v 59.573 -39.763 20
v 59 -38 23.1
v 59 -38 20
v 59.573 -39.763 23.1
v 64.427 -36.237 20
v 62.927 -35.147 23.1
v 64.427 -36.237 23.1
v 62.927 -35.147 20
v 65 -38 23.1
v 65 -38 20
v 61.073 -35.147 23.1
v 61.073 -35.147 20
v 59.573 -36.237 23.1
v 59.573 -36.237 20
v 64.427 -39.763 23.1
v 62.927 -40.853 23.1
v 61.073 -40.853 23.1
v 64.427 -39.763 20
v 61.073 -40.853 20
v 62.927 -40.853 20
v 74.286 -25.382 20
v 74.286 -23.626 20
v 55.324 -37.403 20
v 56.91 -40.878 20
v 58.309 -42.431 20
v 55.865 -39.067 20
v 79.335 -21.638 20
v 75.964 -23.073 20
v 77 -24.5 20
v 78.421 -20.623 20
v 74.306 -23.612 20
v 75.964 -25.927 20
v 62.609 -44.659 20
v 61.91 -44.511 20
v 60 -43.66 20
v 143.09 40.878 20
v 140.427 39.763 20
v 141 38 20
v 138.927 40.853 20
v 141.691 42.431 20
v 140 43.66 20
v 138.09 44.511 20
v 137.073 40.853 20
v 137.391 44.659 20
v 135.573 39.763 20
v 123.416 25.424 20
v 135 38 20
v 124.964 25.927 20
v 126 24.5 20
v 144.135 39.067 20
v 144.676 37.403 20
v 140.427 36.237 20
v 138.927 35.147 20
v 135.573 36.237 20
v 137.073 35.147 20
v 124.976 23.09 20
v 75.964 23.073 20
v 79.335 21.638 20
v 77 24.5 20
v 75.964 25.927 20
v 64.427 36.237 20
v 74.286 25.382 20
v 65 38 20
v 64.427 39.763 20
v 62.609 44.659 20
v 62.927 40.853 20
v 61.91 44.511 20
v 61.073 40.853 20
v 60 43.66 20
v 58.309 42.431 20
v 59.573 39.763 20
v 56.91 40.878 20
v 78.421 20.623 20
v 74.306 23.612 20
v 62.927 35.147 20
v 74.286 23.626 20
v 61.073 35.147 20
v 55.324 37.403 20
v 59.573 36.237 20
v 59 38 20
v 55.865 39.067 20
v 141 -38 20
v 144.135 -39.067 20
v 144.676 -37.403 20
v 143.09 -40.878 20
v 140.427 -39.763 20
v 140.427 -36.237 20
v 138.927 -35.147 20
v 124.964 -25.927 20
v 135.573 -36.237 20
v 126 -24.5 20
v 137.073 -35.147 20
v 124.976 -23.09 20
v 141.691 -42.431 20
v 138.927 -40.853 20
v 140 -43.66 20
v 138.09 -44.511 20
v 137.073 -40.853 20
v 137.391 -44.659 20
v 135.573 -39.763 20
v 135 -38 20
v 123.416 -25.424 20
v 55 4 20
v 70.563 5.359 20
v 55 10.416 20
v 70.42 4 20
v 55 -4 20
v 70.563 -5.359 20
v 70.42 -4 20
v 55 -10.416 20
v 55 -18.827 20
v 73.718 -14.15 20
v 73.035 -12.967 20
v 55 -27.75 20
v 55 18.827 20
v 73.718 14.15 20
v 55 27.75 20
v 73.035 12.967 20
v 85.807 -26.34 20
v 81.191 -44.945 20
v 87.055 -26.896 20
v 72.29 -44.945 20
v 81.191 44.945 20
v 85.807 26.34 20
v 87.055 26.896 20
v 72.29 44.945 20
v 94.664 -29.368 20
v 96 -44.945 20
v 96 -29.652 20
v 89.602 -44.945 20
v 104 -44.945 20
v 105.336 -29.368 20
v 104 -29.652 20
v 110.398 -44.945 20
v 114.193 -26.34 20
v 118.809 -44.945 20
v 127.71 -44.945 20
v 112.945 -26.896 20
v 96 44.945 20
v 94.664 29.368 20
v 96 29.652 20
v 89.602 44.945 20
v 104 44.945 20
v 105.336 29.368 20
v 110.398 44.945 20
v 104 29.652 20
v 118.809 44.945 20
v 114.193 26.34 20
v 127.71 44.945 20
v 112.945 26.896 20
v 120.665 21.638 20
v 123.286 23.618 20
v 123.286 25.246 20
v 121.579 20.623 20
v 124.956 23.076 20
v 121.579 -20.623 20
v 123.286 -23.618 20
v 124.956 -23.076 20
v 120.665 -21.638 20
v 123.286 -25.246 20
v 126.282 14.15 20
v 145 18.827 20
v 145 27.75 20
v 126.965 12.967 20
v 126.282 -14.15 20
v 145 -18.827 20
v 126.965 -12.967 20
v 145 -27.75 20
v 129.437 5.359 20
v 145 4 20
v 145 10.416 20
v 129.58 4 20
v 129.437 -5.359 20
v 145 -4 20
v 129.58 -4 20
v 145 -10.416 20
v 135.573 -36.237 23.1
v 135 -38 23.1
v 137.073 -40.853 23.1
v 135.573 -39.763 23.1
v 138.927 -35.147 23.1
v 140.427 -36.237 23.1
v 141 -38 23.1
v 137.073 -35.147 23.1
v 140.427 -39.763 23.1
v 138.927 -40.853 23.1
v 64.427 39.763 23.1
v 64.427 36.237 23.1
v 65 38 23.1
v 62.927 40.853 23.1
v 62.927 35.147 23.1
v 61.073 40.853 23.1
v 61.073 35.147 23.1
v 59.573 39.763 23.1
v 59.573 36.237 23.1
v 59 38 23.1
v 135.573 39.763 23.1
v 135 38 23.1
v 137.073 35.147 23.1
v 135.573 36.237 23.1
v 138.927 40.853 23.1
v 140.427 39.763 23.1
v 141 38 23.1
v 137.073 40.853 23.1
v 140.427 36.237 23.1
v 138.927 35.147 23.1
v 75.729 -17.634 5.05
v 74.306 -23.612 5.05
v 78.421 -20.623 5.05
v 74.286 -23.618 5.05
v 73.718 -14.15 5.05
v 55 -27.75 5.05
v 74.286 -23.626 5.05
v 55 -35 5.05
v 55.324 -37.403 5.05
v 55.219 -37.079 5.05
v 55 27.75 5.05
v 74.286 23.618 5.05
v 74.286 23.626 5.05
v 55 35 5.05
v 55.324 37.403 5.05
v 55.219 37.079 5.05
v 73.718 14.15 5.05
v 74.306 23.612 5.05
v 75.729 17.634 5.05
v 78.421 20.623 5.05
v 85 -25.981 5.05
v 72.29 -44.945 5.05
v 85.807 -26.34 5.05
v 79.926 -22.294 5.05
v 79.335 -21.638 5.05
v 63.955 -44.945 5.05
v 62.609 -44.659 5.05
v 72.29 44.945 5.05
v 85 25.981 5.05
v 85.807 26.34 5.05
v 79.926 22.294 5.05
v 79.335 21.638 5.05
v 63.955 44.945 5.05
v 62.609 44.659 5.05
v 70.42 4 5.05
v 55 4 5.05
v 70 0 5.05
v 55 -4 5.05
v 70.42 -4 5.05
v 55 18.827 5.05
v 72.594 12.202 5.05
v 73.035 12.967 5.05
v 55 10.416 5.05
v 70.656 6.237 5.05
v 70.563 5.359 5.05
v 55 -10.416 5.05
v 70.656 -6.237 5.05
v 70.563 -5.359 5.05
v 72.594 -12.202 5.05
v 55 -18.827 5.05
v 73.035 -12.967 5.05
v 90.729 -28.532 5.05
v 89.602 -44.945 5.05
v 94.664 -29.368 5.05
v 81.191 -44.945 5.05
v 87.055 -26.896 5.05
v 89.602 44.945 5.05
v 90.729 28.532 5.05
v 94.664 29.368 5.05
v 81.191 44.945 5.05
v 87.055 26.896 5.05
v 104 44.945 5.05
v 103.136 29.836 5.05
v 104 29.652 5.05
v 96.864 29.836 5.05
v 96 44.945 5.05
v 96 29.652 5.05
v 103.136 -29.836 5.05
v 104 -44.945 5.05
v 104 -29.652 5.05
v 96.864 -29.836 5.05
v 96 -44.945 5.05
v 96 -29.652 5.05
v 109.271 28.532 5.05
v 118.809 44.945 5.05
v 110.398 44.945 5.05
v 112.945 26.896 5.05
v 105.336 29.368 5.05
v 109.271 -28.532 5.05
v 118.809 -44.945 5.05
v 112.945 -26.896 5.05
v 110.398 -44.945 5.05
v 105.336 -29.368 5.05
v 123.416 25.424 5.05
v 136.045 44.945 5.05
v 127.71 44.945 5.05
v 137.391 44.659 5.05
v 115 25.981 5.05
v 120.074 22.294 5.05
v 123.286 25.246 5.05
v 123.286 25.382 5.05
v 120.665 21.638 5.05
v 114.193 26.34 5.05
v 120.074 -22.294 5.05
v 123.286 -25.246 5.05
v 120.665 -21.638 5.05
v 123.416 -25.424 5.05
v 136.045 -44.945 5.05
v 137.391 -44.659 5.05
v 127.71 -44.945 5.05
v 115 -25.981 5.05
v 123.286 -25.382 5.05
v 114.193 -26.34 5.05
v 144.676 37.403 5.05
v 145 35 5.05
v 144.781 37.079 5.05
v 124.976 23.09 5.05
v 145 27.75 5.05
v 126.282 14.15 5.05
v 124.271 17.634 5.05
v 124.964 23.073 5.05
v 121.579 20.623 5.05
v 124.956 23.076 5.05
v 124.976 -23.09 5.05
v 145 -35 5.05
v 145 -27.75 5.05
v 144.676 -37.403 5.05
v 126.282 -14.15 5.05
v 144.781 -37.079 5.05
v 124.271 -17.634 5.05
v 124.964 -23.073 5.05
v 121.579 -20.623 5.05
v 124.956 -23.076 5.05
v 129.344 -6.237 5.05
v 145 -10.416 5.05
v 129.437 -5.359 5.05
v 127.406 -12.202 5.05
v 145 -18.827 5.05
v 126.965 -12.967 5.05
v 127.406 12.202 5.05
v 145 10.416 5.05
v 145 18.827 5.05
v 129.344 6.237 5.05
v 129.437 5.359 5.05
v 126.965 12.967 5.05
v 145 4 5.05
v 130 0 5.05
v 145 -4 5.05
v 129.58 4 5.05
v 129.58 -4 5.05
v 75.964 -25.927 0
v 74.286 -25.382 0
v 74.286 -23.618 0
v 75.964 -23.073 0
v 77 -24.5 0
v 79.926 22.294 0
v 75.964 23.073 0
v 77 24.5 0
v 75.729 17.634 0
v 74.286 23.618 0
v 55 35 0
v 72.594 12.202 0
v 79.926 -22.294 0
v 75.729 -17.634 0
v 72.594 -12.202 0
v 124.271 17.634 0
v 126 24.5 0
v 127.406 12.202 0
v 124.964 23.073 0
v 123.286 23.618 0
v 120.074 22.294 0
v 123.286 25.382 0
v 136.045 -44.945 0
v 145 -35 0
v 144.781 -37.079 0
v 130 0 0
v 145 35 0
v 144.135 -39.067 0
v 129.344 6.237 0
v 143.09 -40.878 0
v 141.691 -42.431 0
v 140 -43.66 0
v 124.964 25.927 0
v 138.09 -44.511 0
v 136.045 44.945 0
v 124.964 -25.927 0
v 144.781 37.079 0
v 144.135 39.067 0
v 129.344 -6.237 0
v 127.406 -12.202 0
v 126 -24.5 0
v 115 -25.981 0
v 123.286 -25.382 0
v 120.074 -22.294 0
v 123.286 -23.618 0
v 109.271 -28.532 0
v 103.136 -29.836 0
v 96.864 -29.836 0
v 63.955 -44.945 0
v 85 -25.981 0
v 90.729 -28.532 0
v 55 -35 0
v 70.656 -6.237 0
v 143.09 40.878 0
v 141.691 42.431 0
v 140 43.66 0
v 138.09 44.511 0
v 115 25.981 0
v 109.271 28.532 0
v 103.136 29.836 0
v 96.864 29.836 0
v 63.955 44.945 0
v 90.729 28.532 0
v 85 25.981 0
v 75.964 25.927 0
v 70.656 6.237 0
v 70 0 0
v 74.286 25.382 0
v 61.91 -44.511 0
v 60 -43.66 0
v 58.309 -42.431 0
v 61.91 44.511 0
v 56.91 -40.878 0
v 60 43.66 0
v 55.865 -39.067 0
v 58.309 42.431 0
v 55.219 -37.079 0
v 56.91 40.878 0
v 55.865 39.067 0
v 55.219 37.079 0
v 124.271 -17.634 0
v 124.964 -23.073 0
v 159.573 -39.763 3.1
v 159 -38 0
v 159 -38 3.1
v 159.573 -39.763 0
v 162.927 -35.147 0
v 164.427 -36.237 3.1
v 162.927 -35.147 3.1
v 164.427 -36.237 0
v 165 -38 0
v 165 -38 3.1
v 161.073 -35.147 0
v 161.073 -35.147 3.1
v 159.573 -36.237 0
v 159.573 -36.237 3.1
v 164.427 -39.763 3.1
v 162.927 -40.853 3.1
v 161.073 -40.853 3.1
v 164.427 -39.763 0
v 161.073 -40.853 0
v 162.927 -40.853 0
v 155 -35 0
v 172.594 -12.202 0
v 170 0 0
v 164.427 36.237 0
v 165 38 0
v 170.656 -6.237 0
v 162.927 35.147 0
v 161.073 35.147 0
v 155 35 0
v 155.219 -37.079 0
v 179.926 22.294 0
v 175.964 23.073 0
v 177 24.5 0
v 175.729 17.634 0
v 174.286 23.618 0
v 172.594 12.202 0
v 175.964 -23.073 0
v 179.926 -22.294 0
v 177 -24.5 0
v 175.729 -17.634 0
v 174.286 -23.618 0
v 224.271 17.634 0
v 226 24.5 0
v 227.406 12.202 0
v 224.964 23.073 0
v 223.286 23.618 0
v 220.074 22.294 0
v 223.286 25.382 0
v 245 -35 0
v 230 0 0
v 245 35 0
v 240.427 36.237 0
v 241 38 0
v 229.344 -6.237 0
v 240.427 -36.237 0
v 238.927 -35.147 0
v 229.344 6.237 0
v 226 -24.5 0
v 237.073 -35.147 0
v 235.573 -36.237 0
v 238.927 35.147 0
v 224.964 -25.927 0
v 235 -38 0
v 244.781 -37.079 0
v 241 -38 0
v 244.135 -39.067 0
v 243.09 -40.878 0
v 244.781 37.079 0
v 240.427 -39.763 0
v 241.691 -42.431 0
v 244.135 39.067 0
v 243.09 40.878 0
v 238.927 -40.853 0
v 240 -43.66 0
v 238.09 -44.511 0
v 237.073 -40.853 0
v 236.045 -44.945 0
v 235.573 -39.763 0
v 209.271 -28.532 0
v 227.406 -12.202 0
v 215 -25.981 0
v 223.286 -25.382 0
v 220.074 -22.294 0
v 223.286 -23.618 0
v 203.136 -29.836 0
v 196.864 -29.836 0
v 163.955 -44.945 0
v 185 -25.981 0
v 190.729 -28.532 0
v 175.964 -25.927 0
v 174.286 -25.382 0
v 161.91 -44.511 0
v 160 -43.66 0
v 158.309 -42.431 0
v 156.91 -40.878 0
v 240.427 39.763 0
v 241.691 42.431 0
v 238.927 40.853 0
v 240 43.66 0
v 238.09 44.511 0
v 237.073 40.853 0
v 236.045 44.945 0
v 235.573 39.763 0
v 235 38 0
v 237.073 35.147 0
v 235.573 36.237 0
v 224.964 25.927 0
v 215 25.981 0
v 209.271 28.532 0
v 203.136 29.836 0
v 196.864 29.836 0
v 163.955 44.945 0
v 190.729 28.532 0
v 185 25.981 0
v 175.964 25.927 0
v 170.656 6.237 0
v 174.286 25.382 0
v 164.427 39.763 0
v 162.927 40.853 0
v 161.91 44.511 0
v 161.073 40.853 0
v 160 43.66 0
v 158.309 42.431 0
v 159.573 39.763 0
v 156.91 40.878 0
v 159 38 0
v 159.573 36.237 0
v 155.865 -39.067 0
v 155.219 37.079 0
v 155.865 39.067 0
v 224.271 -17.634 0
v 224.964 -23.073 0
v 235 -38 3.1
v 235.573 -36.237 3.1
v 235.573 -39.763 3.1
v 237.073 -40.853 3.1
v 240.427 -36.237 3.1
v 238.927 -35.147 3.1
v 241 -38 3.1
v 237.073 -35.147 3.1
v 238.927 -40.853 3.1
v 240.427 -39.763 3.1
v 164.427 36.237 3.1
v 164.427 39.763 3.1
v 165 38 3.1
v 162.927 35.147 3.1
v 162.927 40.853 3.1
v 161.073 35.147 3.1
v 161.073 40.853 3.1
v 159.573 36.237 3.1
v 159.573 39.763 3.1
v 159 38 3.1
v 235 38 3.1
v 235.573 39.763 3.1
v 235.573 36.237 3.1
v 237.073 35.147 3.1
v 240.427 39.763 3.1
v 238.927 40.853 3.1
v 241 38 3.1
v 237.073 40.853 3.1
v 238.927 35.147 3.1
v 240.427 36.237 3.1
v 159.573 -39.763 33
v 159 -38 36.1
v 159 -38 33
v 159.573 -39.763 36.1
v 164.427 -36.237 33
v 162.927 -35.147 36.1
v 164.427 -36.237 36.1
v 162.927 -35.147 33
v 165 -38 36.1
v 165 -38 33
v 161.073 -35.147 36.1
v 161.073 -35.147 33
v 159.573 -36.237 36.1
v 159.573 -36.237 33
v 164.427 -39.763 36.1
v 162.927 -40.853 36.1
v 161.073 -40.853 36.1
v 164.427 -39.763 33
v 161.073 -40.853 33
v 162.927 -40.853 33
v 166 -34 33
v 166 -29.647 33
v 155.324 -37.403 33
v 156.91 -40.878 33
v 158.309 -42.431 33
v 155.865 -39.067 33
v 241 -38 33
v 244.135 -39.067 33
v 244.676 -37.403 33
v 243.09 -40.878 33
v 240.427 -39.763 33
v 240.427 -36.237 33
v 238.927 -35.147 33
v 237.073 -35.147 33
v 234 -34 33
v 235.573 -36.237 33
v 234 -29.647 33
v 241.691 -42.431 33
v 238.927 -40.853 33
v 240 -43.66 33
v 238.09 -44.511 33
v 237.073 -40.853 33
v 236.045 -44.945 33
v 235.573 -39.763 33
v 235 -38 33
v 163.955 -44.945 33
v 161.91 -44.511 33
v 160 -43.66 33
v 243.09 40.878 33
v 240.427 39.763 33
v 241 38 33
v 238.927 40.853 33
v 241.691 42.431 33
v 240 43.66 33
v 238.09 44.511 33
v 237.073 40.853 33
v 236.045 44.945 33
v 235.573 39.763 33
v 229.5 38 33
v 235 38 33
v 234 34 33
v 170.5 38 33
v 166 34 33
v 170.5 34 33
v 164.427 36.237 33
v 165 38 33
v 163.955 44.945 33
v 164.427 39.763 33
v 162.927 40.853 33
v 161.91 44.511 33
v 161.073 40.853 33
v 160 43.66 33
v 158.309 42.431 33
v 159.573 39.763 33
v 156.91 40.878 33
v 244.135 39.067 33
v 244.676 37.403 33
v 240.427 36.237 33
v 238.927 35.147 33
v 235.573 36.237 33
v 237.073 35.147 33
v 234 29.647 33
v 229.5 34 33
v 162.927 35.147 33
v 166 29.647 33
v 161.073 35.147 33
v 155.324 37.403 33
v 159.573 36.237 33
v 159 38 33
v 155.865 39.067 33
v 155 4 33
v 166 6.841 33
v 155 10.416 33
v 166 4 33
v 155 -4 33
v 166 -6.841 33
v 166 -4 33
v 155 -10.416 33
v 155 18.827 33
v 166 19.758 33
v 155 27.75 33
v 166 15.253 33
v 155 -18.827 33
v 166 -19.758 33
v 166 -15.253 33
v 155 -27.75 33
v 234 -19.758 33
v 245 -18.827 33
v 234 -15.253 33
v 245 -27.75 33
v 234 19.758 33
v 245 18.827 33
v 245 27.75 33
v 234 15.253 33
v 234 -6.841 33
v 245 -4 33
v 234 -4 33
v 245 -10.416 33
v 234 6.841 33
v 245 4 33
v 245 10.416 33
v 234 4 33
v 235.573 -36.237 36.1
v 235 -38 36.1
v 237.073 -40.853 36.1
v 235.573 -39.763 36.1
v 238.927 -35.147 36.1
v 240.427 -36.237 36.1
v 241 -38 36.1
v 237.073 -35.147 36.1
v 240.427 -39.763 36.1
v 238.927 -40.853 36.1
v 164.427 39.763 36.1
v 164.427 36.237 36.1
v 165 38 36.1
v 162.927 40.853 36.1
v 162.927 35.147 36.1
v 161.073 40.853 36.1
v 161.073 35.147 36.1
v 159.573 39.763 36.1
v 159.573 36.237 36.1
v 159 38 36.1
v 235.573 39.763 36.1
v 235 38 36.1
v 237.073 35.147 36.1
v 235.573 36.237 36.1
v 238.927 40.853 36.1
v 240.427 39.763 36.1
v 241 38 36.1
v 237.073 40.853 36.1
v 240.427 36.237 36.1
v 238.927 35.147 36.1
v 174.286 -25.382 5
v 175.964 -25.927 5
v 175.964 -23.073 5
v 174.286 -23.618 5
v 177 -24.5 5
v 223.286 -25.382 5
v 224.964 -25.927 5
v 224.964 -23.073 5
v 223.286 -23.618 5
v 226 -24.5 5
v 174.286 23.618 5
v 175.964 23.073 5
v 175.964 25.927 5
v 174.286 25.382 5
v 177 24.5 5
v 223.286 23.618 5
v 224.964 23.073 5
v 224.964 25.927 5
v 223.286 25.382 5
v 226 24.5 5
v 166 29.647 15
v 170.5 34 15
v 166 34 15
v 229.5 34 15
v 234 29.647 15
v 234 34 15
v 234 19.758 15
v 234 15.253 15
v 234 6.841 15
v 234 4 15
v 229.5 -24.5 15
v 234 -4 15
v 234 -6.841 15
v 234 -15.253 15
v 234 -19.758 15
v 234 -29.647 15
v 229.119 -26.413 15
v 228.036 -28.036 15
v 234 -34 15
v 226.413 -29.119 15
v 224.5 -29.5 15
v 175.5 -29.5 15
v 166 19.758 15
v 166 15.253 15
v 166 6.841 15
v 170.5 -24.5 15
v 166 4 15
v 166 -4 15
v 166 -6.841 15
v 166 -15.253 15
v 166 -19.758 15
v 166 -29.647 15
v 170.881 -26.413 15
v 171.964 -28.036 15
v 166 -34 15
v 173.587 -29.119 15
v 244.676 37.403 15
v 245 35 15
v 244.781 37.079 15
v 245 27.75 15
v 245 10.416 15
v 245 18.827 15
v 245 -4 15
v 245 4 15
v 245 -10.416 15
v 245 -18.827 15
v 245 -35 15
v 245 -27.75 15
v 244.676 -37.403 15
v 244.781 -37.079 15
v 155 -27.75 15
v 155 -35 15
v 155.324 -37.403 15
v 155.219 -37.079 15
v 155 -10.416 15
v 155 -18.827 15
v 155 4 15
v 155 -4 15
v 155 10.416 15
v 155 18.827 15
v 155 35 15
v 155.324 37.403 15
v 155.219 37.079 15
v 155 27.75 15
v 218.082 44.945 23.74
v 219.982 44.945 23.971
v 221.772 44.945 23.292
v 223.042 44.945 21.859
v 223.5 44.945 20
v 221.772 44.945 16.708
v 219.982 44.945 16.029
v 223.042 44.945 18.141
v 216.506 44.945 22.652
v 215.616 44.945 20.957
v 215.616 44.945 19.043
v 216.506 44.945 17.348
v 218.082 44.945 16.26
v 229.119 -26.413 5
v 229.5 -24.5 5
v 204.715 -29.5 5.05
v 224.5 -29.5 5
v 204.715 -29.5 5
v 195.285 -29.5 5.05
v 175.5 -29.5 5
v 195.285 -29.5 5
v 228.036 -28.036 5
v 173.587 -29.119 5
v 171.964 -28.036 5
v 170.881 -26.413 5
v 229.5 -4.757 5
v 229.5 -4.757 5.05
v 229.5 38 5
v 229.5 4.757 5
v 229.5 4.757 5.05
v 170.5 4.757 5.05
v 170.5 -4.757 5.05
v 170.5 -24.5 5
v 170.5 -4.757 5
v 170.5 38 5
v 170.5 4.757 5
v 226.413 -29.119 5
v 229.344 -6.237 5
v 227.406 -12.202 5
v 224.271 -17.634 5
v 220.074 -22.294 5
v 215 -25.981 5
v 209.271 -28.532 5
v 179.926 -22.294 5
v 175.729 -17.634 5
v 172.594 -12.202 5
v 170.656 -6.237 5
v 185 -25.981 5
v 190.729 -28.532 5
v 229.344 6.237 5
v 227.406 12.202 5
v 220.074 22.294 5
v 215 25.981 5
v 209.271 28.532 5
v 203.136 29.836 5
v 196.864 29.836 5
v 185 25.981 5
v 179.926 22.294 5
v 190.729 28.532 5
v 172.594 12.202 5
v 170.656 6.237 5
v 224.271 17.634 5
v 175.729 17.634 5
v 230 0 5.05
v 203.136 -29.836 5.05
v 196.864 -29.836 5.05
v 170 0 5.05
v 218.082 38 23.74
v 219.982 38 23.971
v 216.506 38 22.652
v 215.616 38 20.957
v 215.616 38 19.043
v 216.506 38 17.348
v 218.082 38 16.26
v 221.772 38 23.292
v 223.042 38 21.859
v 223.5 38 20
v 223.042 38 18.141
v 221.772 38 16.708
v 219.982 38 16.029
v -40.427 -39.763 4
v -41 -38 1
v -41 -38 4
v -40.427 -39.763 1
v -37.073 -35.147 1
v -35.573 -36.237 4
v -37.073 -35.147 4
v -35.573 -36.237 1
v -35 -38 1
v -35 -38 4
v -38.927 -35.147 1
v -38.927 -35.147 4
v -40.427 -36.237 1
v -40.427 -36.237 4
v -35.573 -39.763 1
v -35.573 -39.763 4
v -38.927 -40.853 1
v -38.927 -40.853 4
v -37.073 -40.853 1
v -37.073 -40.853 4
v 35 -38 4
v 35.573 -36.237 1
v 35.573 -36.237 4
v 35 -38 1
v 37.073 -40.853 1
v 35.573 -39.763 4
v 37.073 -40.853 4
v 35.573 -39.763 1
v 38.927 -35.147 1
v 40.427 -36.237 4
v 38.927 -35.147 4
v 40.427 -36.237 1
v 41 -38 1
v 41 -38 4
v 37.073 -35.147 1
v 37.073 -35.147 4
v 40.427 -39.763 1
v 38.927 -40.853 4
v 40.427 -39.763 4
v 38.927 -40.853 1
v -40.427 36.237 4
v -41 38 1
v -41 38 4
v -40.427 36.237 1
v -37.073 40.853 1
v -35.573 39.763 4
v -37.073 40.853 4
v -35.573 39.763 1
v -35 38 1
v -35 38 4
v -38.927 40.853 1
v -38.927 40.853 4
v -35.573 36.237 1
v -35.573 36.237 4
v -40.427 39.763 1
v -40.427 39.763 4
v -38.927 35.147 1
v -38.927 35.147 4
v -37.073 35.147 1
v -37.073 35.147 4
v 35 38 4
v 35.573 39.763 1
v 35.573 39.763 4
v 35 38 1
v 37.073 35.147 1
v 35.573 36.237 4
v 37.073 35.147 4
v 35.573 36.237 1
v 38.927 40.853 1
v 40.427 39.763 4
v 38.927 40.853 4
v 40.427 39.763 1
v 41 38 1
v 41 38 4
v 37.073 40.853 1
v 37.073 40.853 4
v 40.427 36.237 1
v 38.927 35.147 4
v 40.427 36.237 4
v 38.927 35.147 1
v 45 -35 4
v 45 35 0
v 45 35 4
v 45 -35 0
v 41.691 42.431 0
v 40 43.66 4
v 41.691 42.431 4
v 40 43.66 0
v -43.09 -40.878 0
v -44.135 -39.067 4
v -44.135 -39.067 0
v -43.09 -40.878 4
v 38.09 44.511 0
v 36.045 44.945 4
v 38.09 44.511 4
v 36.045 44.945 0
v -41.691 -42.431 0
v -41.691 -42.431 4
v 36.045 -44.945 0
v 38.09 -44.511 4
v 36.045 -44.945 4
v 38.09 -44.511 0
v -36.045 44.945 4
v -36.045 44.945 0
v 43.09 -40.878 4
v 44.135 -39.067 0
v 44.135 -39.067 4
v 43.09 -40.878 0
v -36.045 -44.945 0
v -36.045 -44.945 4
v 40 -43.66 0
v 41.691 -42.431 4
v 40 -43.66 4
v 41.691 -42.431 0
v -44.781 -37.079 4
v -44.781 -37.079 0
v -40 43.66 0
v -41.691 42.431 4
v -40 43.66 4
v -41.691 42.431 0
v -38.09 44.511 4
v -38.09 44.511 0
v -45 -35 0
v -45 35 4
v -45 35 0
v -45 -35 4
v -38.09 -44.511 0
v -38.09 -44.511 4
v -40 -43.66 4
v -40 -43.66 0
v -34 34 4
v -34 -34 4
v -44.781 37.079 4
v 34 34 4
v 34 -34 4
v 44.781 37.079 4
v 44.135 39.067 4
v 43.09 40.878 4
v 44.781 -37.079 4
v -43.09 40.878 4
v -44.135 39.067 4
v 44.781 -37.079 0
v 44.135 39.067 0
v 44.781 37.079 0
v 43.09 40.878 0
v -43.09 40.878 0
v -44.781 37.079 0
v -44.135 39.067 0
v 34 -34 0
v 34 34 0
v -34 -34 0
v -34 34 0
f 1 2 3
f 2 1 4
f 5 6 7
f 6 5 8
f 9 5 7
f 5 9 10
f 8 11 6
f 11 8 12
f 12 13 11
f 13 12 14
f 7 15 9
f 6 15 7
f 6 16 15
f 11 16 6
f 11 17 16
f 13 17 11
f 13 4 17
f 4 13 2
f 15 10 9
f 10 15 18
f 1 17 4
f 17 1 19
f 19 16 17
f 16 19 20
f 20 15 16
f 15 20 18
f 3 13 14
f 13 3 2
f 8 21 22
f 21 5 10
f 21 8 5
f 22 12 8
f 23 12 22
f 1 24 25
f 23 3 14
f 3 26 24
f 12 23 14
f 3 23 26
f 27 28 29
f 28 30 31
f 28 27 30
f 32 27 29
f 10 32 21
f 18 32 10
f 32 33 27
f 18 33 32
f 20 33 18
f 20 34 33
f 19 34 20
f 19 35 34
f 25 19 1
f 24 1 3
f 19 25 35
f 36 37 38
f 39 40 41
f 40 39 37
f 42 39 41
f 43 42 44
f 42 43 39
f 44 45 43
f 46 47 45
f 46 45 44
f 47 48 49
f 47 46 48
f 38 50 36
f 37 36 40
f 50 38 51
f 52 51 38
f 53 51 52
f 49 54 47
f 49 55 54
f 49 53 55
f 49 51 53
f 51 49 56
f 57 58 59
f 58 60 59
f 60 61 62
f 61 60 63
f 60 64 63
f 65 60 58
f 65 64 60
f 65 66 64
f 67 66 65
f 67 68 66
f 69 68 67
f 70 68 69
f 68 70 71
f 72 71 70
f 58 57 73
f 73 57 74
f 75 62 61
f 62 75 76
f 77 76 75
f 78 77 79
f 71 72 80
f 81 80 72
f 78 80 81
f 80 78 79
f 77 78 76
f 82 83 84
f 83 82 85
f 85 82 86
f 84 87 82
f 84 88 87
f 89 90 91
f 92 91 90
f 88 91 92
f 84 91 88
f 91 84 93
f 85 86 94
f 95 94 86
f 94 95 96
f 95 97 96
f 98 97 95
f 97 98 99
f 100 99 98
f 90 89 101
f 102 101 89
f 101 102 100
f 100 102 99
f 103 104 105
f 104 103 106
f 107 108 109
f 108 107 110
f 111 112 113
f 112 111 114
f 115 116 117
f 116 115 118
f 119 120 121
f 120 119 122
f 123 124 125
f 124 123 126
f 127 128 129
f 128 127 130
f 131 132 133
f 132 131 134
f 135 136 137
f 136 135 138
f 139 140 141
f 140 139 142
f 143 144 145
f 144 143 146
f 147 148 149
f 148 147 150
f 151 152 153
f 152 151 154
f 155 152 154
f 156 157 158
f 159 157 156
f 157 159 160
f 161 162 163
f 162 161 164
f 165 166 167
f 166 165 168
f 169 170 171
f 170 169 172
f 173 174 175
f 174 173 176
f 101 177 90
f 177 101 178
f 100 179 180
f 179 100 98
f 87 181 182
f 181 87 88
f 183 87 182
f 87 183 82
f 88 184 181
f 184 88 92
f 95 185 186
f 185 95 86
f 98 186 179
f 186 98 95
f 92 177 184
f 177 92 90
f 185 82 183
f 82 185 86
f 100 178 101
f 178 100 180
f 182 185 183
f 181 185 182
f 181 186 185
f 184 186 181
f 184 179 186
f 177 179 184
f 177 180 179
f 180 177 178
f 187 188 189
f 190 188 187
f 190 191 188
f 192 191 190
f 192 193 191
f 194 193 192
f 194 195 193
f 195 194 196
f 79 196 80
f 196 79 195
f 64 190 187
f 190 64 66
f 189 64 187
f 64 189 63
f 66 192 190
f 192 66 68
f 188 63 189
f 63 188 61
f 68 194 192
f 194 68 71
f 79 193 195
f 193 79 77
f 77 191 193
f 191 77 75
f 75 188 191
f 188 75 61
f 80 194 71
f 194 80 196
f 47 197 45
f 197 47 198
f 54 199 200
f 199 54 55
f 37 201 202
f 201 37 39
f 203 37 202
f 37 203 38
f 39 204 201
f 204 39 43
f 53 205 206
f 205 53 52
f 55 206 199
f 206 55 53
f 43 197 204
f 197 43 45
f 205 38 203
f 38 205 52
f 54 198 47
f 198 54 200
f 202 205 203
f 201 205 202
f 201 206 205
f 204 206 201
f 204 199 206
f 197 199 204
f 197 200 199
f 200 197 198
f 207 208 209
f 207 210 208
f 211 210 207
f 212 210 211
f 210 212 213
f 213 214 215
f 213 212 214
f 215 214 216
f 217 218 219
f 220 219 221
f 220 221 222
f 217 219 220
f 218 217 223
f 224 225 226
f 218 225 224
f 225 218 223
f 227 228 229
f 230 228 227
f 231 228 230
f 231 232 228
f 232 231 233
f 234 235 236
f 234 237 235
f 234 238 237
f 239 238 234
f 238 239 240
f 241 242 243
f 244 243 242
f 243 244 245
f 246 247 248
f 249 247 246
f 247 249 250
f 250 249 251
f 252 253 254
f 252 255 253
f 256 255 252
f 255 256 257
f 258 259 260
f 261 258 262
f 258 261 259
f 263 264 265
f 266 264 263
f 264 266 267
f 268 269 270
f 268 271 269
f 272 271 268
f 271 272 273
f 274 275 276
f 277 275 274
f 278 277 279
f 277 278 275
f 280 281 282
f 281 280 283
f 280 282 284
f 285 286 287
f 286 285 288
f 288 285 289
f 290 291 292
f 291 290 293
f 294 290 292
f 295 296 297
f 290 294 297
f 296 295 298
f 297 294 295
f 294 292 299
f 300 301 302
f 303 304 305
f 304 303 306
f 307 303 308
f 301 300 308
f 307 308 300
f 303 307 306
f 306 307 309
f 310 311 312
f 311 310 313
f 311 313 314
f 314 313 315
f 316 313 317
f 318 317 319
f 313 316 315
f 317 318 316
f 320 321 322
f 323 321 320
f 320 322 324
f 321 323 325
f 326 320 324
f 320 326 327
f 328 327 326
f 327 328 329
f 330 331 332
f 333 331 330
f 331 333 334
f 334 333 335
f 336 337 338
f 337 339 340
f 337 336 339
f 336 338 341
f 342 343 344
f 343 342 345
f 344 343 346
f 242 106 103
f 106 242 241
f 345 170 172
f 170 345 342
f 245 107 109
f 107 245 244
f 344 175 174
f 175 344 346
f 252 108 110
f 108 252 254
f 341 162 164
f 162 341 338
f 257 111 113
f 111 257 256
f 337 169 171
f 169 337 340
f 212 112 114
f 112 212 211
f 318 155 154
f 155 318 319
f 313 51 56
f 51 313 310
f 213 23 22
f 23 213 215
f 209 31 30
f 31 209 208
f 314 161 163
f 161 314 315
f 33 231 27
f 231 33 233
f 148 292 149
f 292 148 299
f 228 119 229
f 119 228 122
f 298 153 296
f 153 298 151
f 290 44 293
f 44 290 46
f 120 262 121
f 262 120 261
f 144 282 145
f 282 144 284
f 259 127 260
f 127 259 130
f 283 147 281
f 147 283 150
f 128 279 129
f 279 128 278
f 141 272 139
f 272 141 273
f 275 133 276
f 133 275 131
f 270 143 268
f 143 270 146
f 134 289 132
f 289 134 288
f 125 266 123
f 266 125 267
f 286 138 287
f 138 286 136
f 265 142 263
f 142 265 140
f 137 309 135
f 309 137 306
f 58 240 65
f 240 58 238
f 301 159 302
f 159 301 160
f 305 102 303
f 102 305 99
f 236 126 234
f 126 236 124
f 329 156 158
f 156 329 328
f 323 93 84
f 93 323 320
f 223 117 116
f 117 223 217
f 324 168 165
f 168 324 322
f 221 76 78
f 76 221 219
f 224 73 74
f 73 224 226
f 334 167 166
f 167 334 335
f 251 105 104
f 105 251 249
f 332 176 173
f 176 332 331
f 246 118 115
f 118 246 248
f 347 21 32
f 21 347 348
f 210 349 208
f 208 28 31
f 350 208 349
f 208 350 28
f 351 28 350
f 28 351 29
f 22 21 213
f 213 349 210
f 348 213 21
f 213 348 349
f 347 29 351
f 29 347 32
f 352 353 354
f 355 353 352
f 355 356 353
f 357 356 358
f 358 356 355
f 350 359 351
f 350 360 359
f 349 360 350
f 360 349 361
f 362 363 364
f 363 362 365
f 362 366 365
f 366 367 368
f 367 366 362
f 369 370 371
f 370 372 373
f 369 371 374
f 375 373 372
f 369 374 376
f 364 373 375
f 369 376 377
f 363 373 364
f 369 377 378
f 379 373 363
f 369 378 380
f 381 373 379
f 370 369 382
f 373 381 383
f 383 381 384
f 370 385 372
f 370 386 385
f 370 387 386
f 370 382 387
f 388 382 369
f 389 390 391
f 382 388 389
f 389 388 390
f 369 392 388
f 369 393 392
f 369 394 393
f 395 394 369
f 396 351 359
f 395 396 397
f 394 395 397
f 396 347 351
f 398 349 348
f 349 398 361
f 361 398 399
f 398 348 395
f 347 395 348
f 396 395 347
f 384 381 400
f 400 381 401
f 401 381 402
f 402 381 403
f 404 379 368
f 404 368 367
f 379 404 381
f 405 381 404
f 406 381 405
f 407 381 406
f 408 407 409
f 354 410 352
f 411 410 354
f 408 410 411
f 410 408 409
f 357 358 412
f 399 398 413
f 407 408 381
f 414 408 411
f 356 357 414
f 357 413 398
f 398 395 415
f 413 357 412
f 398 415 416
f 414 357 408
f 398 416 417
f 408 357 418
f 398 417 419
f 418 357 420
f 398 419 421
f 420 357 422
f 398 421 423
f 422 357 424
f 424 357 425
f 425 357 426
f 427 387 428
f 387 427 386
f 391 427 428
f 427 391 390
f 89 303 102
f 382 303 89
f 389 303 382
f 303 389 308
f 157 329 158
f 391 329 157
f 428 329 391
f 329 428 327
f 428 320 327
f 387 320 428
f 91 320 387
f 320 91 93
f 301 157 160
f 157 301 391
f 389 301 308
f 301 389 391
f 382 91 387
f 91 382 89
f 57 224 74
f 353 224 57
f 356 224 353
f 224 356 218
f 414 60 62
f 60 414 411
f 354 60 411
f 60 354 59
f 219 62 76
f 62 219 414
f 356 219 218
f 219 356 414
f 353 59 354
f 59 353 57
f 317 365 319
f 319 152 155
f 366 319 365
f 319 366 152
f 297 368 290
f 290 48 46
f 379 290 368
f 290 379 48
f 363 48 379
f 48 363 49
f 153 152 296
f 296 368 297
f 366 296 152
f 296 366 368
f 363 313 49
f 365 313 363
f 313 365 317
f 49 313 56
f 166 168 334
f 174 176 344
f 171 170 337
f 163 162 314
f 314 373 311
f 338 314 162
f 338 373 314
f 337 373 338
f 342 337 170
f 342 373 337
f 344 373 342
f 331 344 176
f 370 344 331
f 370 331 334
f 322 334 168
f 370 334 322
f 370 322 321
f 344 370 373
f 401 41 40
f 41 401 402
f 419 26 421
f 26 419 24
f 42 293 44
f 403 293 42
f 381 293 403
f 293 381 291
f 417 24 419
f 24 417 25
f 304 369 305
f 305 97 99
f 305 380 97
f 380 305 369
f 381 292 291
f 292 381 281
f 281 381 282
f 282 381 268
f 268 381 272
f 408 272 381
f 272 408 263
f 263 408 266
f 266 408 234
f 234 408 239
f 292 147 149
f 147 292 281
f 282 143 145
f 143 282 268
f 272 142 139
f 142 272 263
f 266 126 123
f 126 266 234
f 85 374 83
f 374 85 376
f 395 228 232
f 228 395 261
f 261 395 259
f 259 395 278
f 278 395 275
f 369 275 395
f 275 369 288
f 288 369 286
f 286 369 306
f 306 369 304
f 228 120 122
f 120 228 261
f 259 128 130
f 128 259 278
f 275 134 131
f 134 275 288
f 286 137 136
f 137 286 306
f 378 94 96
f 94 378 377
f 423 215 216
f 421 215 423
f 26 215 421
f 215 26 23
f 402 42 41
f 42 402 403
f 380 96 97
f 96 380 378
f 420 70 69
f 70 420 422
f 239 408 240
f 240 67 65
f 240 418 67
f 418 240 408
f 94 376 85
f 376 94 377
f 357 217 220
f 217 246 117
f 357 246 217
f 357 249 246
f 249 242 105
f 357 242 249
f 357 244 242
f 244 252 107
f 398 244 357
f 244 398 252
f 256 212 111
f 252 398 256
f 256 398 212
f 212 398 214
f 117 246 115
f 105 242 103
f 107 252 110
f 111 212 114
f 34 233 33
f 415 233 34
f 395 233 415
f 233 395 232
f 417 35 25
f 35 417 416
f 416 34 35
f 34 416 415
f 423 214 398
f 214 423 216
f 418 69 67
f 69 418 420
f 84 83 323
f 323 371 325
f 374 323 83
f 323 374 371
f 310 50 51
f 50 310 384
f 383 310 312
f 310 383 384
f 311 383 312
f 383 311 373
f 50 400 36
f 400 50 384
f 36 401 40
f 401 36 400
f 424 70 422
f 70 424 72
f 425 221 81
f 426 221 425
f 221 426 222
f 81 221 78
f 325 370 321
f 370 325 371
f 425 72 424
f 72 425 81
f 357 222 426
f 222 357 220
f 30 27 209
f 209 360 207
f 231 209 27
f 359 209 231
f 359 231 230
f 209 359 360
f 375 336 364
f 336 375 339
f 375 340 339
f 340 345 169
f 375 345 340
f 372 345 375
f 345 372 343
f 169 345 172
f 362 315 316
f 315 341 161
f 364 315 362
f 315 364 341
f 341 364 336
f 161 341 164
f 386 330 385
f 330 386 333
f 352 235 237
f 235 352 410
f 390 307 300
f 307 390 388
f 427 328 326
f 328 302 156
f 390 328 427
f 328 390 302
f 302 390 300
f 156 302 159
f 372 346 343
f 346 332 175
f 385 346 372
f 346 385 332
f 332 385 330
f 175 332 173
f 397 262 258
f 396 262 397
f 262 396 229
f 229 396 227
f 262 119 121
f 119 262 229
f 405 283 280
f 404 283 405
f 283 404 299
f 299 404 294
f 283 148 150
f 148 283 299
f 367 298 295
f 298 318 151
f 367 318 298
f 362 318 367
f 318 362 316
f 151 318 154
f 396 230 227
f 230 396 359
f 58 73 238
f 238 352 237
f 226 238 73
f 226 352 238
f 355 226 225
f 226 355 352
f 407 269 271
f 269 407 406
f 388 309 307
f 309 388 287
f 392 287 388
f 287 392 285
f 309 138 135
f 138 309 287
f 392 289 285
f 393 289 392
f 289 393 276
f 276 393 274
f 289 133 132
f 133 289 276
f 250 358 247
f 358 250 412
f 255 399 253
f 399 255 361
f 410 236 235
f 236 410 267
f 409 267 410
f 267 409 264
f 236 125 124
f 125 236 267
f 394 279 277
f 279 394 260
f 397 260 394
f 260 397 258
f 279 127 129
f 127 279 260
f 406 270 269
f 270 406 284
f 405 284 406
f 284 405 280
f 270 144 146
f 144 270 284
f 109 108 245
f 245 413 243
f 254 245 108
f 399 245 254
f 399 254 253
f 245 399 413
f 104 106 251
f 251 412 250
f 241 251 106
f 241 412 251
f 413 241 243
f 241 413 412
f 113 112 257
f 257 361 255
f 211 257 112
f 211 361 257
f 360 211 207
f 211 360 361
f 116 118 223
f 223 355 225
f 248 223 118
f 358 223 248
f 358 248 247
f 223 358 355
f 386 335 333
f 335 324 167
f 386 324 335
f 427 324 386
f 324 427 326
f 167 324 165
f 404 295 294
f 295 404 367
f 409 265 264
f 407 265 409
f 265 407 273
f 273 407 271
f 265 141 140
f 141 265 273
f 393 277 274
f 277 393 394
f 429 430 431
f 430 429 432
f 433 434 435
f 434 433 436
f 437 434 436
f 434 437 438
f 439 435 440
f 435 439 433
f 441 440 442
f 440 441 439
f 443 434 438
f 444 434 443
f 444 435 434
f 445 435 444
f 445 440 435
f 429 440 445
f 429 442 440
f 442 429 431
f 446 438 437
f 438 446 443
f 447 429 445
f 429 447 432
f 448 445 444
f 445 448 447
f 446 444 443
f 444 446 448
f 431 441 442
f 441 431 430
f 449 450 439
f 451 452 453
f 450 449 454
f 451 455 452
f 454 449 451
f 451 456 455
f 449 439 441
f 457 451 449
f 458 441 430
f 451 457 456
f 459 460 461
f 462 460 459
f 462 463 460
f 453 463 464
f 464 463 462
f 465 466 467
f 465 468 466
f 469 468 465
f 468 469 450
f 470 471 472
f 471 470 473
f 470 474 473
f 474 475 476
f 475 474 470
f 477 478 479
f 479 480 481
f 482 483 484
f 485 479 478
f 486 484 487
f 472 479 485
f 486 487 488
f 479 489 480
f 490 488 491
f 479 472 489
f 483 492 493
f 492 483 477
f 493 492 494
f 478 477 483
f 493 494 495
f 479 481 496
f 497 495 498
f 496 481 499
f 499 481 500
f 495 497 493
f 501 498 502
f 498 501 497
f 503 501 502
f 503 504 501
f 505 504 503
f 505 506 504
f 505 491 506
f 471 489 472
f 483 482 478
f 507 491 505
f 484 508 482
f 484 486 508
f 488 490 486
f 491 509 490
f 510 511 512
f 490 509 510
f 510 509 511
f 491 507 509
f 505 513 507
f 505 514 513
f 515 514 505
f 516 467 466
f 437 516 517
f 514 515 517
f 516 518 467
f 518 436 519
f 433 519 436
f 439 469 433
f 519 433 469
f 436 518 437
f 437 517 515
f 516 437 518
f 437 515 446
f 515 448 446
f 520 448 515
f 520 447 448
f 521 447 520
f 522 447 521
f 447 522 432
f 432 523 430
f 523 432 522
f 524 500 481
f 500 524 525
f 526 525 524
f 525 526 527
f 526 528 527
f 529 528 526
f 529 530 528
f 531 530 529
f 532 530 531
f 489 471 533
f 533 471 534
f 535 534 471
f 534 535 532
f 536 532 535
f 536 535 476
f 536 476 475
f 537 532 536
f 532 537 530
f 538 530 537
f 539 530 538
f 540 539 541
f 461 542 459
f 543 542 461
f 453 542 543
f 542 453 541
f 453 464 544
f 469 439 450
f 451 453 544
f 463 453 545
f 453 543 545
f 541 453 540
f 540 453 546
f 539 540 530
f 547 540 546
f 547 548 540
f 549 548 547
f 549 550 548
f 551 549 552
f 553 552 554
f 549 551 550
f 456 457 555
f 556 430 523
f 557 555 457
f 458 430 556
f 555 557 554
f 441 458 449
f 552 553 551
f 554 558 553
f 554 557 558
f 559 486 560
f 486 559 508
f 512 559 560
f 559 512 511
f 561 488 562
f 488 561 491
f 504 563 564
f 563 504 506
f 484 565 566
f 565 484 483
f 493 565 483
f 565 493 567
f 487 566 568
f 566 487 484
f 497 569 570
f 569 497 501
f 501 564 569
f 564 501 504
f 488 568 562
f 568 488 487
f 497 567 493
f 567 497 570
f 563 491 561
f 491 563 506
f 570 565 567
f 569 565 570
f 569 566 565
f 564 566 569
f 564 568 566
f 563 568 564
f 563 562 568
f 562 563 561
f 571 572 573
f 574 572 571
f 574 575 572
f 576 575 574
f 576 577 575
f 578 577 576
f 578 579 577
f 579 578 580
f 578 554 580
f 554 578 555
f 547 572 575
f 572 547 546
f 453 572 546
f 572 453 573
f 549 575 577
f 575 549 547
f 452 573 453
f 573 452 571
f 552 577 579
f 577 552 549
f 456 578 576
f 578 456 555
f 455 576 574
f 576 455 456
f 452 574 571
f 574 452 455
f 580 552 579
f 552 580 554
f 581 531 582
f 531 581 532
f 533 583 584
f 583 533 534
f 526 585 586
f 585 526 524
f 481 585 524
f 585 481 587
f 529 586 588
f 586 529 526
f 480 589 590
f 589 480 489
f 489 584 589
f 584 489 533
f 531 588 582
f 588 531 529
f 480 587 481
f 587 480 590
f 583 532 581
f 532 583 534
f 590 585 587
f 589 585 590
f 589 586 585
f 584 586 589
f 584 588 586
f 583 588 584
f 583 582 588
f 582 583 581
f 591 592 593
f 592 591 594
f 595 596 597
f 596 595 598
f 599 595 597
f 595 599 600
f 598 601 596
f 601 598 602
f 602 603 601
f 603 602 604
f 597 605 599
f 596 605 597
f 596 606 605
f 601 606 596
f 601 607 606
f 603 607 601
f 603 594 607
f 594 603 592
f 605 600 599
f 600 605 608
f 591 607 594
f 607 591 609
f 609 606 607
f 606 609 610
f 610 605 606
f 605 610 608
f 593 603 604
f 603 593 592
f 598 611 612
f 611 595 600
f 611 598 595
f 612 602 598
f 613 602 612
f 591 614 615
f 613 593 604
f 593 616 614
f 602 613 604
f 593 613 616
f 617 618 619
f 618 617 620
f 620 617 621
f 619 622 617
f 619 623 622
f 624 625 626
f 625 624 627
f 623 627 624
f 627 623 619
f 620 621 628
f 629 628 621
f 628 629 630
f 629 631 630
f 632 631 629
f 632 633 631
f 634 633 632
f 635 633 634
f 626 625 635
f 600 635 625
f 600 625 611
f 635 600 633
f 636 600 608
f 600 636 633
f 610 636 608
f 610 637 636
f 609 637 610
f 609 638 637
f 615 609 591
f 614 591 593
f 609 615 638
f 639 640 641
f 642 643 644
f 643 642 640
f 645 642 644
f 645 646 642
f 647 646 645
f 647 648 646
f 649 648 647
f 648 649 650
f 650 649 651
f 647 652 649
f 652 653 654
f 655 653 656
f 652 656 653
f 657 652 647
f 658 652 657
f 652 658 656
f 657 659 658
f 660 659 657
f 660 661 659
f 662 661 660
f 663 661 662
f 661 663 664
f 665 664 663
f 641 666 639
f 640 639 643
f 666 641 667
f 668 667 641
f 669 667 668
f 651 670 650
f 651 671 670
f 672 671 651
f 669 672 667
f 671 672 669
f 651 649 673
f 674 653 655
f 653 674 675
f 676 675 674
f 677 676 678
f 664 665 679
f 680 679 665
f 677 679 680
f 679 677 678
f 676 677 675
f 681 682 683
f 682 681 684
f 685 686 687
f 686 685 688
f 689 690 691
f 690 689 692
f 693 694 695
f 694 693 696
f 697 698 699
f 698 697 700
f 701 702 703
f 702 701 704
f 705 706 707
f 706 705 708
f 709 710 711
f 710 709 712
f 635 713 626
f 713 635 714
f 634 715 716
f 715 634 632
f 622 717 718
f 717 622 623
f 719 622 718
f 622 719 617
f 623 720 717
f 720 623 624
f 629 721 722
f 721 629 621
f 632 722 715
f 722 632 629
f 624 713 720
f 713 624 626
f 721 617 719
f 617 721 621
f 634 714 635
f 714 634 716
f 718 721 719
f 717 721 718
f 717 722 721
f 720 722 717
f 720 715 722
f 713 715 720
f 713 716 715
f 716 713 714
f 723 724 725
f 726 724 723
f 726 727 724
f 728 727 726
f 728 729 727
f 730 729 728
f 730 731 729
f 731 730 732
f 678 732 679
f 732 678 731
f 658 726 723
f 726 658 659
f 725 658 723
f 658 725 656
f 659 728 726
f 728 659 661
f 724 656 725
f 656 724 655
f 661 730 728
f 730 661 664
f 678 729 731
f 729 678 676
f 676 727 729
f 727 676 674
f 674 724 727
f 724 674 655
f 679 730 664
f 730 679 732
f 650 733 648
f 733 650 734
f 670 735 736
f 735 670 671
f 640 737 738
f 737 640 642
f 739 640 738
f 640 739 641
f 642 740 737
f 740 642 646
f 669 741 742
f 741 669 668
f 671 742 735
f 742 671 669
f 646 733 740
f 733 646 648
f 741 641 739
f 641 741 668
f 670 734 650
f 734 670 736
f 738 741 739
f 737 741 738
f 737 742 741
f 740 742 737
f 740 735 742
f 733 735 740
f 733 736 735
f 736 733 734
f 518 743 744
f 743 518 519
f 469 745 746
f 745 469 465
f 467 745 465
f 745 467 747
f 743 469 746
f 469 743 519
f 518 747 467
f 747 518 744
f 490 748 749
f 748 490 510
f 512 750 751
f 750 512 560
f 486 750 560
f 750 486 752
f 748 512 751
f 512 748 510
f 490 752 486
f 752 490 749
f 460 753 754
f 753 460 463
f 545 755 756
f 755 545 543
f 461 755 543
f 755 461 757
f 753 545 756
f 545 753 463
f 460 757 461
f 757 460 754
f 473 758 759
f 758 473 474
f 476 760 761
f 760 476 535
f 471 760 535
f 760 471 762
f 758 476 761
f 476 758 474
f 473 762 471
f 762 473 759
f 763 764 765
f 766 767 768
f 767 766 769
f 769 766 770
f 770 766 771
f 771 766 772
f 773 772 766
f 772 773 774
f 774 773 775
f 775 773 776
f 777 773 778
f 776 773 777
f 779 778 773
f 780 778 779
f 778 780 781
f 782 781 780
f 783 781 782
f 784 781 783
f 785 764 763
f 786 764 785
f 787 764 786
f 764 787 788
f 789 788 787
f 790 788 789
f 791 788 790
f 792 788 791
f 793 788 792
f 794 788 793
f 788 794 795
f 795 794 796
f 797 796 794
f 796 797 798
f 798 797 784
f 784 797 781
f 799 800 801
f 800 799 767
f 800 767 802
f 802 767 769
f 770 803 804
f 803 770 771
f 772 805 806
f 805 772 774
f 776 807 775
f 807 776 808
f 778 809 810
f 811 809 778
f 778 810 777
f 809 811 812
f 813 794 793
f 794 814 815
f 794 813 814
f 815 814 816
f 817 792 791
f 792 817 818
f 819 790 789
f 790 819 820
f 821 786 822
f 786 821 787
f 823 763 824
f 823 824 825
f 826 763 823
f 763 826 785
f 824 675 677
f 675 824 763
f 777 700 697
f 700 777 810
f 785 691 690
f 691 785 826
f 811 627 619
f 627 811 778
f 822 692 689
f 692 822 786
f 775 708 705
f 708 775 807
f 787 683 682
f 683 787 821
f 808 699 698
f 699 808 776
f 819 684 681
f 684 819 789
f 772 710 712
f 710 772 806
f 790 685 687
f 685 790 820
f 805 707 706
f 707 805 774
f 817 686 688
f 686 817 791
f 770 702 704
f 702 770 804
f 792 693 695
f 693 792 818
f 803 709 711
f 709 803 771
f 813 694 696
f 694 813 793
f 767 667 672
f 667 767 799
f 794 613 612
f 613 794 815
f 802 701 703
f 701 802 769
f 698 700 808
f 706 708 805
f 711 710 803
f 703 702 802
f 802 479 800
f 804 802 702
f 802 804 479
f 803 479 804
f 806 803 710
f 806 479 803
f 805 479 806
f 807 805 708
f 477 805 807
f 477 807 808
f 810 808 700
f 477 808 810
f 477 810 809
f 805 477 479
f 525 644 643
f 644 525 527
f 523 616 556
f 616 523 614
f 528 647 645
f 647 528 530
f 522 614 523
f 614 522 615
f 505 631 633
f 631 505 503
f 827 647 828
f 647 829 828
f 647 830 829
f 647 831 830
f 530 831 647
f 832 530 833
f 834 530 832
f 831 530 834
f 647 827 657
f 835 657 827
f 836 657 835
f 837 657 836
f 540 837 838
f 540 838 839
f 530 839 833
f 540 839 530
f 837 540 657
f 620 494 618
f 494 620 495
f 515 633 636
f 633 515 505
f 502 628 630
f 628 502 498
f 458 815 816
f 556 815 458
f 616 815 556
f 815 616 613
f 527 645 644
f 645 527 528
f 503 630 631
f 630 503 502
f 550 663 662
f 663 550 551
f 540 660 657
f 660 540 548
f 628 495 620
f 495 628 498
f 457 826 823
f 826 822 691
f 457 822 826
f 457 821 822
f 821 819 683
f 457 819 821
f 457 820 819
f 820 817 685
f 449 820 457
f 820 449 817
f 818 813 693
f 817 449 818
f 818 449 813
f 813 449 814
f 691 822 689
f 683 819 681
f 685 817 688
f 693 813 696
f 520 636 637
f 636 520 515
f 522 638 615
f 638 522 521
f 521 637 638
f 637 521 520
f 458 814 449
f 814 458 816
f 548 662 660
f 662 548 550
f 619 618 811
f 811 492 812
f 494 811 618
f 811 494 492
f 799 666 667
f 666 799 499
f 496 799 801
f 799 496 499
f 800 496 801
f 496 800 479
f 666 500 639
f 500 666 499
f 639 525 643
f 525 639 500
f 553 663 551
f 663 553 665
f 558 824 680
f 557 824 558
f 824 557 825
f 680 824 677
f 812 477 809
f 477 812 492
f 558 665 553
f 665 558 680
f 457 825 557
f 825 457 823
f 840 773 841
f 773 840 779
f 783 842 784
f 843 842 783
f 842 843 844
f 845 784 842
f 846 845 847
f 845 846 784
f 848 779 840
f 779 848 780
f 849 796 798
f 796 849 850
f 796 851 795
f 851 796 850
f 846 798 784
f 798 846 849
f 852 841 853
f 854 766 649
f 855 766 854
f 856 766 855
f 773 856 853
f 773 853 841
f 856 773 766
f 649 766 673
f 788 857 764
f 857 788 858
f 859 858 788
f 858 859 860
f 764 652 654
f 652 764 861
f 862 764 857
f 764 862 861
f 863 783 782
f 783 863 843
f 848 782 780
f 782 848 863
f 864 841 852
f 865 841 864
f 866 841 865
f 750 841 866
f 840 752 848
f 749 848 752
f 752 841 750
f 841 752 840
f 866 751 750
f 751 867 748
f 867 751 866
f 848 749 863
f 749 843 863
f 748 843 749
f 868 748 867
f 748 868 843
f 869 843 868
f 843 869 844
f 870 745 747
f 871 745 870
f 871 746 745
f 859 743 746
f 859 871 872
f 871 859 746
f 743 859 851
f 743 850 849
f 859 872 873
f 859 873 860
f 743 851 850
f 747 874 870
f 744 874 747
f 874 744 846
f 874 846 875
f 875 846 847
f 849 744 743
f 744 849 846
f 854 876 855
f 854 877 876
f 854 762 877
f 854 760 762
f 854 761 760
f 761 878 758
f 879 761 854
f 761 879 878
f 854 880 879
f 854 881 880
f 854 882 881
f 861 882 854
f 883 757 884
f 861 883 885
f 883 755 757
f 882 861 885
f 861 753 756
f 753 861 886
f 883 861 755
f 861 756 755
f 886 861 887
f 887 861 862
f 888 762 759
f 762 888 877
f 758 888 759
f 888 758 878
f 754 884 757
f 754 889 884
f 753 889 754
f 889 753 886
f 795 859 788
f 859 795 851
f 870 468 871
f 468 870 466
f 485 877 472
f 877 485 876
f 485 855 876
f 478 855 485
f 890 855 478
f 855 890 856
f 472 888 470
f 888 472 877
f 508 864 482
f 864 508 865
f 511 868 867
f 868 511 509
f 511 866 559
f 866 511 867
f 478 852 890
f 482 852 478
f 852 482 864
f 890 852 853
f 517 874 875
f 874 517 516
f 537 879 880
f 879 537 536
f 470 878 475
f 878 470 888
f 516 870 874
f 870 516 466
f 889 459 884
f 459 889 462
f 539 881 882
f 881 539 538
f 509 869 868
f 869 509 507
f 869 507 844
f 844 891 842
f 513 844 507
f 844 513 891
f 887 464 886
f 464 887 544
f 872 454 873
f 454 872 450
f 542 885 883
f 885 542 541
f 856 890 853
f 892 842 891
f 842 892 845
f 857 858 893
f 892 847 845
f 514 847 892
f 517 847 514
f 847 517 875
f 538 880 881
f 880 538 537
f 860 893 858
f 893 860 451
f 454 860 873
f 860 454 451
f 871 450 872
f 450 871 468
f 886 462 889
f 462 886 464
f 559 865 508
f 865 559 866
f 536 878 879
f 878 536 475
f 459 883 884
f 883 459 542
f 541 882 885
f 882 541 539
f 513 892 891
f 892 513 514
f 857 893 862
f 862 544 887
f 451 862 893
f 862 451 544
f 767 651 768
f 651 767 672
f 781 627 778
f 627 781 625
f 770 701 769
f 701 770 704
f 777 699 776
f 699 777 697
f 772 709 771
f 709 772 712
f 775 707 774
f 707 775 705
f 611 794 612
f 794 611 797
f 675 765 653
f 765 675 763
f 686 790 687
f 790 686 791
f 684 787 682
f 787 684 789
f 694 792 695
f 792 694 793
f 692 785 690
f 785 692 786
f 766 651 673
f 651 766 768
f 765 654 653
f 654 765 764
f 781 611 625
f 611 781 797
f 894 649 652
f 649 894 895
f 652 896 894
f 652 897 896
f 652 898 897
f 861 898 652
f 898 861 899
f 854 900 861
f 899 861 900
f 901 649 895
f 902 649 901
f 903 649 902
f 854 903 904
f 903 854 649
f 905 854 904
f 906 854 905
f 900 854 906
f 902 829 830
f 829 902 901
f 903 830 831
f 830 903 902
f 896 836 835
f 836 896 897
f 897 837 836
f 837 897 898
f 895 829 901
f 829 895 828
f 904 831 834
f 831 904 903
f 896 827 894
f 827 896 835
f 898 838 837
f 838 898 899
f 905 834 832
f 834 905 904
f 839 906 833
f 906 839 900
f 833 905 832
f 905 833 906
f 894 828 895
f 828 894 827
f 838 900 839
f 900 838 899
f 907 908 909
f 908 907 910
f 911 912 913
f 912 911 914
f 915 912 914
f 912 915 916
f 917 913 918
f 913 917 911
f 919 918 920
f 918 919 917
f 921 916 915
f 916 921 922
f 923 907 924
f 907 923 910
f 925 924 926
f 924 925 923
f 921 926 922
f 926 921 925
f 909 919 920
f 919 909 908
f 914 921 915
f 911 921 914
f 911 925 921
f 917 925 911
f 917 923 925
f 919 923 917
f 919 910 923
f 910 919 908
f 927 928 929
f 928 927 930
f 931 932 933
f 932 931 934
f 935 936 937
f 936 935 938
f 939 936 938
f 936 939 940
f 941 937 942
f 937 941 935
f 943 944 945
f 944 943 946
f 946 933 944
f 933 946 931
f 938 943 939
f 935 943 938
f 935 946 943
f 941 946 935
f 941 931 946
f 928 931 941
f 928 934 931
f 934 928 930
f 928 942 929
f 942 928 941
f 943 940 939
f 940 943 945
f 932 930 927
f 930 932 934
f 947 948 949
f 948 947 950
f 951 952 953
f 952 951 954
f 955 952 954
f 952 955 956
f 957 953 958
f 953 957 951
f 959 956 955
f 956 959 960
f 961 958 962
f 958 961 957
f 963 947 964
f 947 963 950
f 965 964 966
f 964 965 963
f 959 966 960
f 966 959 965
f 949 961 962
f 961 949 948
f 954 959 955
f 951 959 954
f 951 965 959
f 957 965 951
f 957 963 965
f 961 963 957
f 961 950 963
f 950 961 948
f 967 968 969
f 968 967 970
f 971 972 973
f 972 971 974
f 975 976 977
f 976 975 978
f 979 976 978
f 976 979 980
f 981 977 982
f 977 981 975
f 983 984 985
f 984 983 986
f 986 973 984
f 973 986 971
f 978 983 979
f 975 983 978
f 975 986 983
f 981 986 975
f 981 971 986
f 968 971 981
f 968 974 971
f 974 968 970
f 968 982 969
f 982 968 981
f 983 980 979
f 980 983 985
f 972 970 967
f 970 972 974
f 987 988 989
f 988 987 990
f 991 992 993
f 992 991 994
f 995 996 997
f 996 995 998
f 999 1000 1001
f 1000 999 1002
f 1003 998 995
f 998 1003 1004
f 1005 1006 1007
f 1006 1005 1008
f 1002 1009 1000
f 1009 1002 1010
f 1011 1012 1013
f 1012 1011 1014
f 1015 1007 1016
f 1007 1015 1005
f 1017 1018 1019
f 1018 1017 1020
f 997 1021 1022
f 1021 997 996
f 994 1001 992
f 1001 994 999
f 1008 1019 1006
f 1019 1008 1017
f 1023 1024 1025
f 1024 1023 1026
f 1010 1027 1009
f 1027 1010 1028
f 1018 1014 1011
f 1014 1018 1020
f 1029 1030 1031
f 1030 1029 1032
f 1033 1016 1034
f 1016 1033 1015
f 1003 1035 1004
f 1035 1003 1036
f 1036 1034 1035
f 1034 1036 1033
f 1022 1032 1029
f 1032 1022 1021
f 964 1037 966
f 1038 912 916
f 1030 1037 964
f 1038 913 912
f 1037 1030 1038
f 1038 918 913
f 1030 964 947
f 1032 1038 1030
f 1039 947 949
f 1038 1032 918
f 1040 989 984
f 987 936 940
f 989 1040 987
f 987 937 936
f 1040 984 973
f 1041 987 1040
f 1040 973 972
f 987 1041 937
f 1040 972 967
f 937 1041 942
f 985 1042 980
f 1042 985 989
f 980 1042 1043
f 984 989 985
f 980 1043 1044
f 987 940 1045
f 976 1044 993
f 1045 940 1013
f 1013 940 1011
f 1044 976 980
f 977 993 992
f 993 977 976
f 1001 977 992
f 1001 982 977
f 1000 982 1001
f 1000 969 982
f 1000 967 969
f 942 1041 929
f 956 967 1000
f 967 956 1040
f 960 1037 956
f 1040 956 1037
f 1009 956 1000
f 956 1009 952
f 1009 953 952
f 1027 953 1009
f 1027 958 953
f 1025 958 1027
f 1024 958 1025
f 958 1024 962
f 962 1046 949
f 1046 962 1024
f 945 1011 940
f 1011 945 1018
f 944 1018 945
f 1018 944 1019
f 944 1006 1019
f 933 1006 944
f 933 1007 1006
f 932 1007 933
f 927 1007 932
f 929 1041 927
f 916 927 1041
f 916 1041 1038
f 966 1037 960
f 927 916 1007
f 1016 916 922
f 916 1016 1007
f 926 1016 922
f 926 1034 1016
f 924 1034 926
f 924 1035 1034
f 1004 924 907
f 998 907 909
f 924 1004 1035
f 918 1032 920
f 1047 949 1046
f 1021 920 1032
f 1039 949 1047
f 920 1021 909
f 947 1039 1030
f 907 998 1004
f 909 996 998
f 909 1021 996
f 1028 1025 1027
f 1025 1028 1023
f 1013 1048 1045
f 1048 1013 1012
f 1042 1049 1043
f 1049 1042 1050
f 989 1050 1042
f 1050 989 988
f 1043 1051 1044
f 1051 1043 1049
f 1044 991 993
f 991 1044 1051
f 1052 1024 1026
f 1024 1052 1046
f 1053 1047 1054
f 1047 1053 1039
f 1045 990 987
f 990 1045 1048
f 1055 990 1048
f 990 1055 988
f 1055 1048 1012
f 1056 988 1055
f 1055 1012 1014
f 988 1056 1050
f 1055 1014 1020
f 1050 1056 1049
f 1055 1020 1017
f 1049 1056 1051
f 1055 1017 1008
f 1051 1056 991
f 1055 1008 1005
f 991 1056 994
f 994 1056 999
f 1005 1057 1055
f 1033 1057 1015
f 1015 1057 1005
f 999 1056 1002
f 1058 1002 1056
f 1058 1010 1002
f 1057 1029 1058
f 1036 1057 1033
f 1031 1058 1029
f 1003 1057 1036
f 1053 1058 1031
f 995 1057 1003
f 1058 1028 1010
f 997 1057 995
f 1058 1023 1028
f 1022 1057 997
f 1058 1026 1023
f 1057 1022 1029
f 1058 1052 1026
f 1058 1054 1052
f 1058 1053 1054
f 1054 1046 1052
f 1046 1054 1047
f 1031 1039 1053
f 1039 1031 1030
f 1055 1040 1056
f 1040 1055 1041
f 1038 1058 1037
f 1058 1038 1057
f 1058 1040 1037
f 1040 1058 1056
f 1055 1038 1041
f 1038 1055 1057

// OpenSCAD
//$fn=50;


base_width = 90;
base_round = 10;
base_grill_lip = 10;
base_grill_height = 10;
base_grill_width = 8;
base_center_hole_r = 30;
base_hole_dropdown = 8;

Base_height = base_grill_height+base_grill_lip;

peg_r = 3;
peg_length = 3;
peg_inset = 7;

fan_case_height = 10;
fan_width = 59;
fan_indent = 10;
fan_lip= 5;
fan_r = 5;
fan_screw_inset= 5;;
fan_screw_r = 1.5;

cooler_width= 68;
cooler_height =18;

d= 0.05;

//MAIN



translate([100,0,0]){
base();
}
translate([200,0,0]){
fancase();
}
top();

module top(){

difference(){
roundsidedCube(base_width,base_width,4,base_round);
translate([0,0,1]){
pegs();
}
translate([-cooler_width/2,-cooler_width/2,-d]){
#cube([cooler_width,cooler_width,10]);
}

}

}

module fancase(){
translate([0,0,fan_case_height+cooler_height+fan_lip]){
 pegs();
}
	difference(){
		roundsidedCube(base_width,base_width,fan_case_height+cooler_height+fan_lip,base_round);

		translate([0,0,fan_lip]){
			roundsidedCube(fan_width,fan_width,cooler_height+d,fan_r);   // fan indent
		}

		translate([0,0,-d]){
			cylinder(r=base_center_hole_r, h =  fan_lip+fan_case_height-fan_indent+2*d);
		}

		
		cylinder(r=base_center_hole_r, h = fan_case_height-fan_indent );
		screws(fan_case_height);
		
		pegs();

		translate([-cooler_width/2,-cooler_width/2,fan_case_height+fan_lip]){
			cube([cooler_width,cooler_width,cooler_height+d]);
		}
		translate([0,0,fan_case_height+fan_lip]){
			vents(-2,2,cooler_height,base_grill_width,18);
		}
		translate([-fan_width/2,cooler_width/2-d-11,fan_case_height+fan_lip-fan_indent]){
			cube([fan_width,15+d,cooler_height+fan_indent+d]);
		}

translate([fan_width/2-10,fan_width/2+20,fan_indent+10])
rotate(a= 90, v= [1,0,0])
cylinder(r=4, h = 20 );

	}

}


module base(){

	translate([0,0,Base_height]){
		pegs();
	}

	difference(){
		roundsidedCube(base_width,base_width,Base_height,base_round);
		translate([0,0,-d]){
			cylinder(r=base_center_hole_r, h = Base_height +2*d);
		}

		hull(){
			cylinder(r=base_center_hole_r, h = Base_height +d);
		}
		translate([0,0,5+d]){
	      		 vents(0,10,Base_height-5,base_grill_width,18);
		}
screws(Base_height);
              
	}
}




module screws(h1){
		translate([-(fan_width/2 -fan_screw_inset),-(fan_width/2 -fan_screw_inset),0]){
			cylinder(r=fan_screw_r, h = h1 );
		}
		translate([(fan_width/2 -fan_screw_inset),-(fan_width/2 -fan_screw_inset),0]){
			cylinder(r=fan_screw_r, h = h1 );
		}
		translate([-(fan_width/2 -fan_screw_inset),(fan_width/2 -fan_screw_inset),0]){
			cylinder(r=fan_screw_r, h = h1 );
		}
		translate([(fan_width/2 -fan_screw_inset),(fan_width/2 -fan_screw_inset),0]){
			cylinder(r=fan_screw_r, h = h1);
		}
}



module pegs(){
translate([0,0,0]){
translate([(-base_width/2)+peg_inset,(-base_width/2)+peg_inset,0]){
	cylinder(h=peg_length+2*d, r =peg_r );
}
translate([(base_width/2)-peg_inset,(-base_width/2)+peg_inset,0]){
	cylinder(h=peg_length+2*d, r =peg_r );
}
translate([(-base_width/2)+peg_inset,(base_width/2)-peg_inset,0]){
	cylinder(h=peg_length+2*d, r =peg_r );
}
translate([(base_width/2)-peg_inset,(base_width/2)-peg_inset,0]){
	cylinder(h=peg_length+2*d, r =peg_r );
}
}
}


module vents(b,n,h,w,a){
	for ( i = [b:n]){	
		translate([0,0,0]){
			rotate(a = a*i, v=[0,0,1]){
				//vent();
				translate([-base_width,-w/2,0]){
					cube([2*base_width,w,h+d]);
				}
			}
		}
	}
}

module vent(){
				rotate(a=90,v=[1,0,0])
				hull(){
					translate([0,5,0]){
						cylinder(r = 5, h = 2*base_width+d, center = true);
					}
					cylinder(r = 5, h = 2*base_width+d, center = true);
				}
}


module roundsidedCube(x,y,z,r){
	linear_extrude(height=z){
		roundsidedsquare(x,y,r);
	}
}

module roundsidedsquare(x,y,r){
		minkowski()
		{
			 square([x-(r*2),y-(r*2)], center= true);
			 circle(r);
		}	
}
